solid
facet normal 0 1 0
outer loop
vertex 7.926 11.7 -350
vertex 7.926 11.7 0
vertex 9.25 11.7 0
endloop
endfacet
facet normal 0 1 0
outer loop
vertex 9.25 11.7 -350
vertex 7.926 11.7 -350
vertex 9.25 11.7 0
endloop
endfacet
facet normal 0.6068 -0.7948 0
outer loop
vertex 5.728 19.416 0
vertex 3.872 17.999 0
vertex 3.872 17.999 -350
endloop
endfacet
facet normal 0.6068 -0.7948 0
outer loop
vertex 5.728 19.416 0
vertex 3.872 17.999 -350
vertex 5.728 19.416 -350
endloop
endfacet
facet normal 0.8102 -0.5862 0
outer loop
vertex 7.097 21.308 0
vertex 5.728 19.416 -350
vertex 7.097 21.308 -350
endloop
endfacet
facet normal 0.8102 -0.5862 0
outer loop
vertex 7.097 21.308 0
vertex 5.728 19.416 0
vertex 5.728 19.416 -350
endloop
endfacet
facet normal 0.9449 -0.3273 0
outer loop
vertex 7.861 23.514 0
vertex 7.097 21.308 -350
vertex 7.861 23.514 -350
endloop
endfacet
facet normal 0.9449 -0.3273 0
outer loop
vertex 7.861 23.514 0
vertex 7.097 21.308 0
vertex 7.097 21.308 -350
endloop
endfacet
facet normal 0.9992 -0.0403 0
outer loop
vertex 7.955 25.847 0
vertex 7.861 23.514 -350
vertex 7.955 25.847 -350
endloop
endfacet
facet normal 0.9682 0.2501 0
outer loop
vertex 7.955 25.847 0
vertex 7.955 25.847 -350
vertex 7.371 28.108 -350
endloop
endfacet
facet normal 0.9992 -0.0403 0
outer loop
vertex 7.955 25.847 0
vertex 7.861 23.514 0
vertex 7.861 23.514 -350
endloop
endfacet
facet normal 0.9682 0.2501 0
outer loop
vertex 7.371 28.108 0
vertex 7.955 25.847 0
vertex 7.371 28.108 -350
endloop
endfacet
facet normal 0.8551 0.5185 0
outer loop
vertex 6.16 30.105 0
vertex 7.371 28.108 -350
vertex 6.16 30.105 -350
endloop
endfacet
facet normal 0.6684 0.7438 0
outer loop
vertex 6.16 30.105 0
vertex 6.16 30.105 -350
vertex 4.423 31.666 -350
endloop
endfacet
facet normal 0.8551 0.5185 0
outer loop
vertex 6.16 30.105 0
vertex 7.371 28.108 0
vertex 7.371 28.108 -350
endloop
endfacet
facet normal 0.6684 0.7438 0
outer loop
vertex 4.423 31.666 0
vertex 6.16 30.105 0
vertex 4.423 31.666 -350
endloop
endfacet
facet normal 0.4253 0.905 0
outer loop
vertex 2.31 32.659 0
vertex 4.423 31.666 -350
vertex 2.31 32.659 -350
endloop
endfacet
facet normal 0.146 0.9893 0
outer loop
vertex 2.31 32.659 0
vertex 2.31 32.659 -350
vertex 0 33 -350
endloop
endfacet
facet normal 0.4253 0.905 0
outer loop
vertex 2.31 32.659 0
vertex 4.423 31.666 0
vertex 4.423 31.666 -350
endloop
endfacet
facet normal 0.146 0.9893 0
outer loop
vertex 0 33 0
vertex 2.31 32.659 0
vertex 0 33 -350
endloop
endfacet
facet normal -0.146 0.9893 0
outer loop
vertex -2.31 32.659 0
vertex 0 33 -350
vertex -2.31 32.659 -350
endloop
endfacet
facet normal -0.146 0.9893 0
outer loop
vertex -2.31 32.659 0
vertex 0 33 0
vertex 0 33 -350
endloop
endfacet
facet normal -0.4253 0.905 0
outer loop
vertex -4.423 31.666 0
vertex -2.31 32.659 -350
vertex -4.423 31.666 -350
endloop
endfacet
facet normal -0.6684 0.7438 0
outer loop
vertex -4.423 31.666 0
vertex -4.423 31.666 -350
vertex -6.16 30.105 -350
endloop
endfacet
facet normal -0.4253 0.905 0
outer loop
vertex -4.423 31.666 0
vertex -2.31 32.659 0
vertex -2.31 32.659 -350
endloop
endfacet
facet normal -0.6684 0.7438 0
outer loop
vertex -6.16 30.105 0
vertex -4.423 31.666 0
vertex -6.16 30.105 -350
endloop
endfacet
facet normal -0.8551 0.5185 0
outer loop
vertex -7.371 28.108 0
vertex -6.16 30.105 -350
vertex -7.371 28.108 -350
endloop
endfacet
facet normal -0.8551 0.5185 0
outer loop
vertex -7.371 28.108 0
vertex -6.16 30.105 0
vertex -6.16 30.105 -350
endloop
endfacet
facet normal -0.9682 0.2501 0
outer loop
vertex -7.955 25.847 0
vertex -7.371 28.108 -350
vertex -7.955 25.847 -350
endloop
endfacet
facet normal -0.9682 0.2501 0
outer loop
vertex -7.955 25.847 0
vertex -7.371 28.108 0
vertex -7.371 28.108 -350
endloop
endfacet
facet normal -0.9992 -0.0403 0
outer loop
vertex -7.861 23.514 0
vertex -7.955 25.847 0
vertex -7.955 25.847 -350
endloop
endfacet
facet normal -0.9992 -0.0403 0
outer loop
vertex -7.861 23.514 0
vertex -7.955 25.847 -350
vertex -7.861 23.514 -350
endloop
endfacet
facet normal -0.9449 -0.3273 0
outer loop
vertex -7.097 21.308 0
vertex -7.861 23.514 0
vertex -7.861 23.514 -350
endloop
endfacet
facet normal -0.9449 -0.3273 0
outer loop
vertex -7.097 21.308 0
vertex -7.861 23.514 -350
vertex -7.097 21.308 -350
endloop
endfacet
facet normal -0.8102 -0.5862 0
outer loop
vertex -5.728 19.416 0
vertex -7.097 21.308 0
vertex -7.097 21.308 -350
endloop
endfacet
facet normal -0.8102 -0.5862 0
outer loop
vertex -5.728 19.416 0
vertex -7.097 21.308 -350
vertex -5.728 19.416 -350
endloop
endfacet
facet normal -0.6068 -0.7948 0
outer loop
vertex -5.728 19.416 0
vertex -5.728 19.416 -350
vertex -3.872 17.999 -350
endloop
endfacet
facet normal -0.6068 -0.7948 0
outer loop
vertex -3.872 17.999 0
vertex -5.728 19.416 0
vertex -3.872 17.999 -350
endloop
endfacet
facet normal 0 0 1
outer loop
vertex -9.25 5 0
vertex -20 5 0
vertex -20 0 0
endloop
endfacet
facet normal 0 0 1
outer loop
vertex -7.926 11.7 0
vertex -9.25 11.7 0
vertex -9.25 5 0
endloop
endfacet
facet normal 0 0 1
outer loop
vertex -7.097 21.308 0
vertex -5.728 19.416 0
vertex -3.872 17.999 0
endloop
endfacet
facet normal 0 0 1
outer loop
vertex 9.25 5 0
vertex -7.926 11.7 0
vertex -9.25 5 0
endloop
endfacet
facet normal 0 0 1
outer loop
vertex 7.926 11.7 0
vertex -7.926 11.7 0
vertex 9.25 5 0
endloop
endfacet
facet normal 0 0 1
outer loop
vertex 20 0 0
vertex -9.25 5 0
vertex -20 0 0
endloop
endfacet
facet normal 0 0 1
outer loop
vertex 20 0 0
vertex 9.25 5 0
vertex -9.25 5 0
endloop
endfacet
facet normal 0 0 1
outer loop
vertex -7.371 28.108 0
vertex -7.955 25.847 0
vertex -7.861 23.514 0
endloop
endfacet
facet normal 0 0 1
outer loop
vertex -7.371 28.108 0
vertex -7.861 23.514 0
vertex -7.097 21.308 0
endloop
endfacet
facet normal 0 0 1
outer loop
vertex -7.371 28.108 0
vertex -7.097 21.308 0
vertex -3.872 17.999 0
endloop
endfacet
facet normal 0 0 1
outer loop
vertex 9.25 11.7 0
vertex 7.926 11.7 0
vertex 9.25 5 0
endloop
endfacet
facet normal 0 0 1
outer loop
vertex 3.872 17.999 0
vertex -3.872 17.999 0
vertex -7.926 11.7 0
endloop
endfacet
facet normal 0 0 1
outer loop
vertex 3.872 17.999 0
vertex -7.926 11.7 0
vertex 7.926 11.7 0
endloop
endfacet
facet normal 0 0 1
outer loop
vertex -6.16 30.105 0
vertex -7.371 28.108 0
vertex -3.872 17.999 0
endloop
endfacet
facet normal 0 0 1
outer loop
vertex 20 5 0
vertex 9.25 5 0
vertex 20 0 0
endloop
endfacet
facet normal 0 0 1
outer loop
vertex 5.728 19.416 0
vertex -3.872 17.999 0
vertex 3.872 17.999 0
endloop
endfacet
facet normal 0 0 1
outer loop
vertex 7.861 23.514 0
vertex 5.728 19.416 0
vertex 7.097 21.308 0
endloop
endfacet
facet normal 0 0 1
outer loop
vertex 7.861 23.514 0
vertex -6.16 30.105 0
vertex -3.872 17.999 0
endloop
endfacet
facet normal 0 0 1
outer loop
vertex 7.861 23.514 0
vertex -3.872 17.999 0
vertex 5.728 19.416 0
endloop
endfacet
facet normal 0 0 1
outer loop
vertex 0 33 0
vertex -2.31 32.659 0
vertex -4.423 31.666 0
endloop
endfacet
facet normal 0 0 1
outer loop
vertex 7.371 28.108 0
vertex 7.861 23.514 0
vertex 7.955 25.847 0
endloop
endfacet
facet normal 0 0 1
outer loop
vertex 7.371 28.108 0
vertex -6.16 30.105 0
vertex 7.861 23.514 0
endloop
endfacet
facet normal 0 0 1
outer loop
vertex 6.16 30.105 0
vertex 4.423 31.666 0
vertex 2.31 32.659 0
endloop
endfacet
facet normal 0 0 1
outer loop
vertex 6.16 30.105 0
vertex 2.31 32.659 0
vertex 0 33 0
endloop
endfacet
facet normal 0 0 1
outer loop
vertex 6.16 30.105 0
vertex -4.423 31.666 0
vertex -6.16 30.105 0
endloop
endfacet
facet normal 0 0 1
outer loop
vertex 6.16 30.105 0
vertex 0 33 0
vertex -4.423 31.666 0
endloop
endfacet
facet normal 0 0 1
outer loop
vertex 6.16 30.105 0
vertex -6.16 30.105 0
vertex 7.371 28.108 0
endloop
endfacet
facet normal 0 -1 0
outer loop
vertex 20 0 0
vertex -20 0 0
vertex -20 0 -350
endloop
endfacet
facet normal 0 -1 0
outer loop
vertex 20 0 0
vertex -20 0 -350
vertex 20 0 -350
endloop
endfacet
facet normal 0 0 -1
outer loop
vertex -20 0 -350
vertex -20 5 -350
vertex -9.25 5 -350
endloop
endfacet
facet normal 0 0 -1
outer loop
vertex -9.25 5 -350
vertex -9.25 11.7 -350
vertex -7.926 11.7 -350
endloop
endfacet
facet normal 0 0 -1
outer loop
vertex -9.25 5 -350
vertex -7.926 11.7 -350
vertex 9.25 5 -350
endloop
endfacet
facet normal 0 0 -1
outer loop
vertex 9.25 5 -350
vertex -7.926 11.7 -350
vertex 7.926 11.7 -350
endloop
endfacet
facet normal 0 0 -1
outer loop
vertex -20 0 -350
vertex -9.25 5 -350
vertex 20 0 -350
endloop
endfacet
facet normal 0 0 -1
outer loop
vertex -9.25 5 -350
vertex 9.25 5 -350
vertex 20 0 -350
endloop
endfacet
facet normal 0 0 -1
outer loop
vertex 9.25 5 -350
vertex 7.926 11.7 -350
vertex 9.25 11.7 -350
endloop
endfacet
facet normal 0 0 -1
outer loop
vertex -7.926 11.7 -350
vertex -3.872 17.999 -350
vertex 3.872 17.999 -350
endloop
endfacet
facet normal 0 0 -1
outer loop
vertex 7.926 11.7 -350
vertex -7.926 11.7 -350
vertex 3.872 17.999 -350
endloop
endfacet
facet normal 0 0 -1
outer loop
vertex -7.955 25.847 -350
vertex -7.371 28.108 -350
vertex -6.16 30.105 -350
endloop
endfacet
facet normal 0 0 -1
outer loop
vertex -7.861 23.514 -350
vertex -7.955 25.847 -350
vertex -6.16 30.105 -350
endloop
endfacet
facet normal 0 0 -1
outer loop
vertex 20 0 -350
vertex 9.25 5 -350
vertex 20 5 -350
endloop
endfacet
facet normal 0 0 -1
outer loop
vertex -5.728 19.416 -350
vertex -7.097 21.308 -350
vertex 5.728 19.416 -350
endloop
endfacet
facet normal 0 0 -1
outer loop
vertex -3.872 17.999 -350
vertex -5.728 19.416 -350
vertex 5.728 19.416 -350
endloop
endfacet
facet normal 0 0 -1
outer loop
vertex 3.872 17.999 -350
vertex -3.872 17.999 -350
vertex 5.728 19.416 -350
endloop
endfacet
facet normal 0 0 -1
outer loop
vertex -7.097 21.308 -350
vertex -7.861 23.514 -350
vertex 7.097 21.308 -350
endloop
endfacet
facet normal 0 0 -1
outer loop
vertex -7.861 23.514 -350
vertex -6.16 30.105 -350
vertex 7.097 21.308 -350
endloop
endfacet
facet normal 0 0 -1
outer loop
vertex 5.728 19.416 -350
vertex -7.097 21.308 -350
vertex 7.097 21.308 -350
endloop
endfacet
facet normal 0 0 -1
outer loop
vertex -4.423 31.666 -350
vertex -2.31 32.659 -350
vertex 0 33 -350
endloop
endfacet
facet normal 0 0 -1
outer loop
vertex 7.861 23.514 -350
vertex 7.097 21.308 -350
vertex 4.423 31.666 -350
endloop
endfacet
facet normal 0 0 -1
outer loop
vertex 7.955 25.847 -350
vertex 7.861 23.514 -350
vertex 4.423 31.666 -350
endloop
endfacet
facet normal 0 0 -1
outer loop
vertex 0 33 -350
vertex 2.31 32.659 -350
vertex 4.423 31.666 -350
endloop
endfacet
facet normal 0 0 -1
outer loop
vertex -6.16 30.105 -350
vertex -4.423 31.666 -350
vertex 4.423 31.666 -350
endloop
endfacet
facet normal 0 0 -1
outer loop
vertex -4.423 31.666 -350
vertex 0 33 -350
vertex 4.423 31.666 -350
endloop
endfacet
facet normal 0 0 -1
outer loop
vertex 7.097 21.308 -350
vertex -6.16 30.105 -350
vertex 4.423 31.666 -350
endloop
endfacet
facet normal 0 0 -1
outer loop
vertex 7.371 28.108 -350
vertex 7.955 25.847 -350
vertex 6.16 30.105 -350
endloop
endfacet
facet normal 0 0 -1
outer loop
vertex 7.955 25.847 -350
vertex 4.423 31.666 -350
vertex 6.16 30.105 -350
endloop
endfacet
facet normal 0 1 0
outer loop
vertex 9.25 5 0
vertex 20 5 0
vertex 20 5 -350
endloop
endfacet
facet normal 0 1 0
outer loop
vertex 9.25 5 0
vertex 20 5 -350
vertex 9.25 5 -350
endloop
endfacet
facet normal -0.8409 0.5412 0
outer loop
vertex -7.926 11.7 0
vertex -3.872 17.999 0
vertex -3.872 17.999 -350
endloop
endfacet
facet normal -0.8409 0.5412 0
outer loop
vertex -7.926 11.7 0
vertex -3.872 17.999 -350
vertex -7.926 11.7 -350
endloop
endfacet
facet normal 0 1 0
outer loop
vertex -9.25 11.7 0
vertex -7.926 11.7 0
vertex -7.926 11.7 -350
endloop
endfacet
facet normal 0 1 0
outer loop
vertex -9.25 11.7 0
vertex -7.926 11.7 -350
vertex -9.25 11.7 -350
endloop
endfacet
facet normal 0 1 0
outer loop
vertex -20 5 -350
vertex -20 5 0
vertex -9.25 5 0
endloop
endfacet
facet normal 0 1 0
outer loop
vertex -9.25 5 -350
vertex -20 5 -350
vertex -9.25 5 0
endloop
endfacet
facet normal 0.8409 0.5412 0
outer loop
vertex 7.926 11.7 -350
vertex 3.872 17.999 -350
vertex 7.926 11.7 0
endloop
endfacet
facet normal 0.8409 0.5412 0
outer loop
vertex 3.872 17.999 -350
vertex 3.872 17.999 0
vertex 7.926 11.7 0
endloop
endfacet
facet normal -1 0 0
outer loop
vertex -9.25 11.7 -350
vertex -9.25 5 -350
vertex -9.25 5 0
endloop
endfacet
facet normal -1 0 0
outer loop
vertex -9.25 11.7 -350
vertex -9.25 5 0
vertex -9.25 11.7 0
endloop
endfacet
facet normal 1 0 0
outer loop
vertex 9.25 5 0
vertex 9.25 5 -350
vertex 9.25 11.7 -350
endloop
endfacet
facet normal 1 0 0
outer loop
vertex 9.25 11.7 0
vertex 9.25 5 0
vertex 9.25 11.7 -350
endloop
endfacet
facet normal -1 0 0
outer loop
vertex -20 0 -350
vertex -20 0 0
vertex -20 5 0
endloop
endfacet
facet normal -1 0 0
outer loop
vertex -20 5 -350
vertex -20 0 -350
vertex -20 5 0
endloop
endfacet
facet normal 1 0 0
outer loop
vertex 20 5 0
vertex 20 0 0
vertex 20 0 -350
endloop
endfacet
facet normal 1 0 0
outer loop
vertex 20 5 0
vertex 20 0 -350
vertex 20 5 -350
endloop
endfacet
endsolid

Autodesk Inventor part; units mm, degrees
ref_plane "YZ Plane" through (0, 0, 0) normal (1, 0, 0) x (0, 1, 0)
ref_plane "XZ Plane" through (0, 0, 0) normal (0, 1, 0) x (-1, 0, 0)
ref_plane "XY Plane" through (0, 0, 0) normal (0, 0, 1) x (1, 0, 0)
sketch "Sketch1" plane through (0, 0, 0) normal (0, 0, 1) x (1, 0, 0)
  line L0 (-20, 0) -> (20, 0)
  line L1 (-20, 0) -> (-20, 5)
  line L2 (20, 0) -> (20, 5)
  line L3 (-20, 5) -> (-9.25, 5)
  line L4 (20, 5) -> (9.25, 5)
  line L5 (-9.25, 5) -> (-9.25, 11.7)
  line L6 (9.25, 5) -> (9.25, 11.7)
  line L7 (-9.25, 5) -> (9.25, 5) construction
  line L8 (-9.25, 5) -> (-4.2961, 5) construction
  line L9 (9.25, 5) -> (3.3755, 5) construction
  arc A0 (4.1601, 14.485) -> (5.7961, 15.0092) centre (4, 17.8) ccw construction
  line L10 (7.926, 11.7) -> (9.25, 11.7)
  line L11 (-7.926, 11.7) -> (-9.25, 11.7)
  arc A1 (3.8717, 17.9993) -> (-3.8717, 17.9993) centre (0, 25) ccw
  line L12 (-3.8717, 17.9993) -> (-7.926, 11.7)
  line L13 (3.8717, 17.9993) -> (7.926, 11.7)
  point P0 (0, 0)
  point P1 (0, 0)
  point P2 (0, 17.8)
  point P3 (0, 5)
  point P4 (-4, 17.8)
  dimension "d0" = 40
  dimension "d1" = 5
  dimension "d2" = 5
  dimension "d3" = 10.75
  dimension "d4" = 10.75
  dimension "d5" = 6.7
  dimension "d6" = 6.7
  dimension "d15" = 25
  dimension "d16" = 18.5
  dimension "d18" = 8
extrude "Extrusion1" add sketch "Sketch1" against normal blind 350
equation "\"d1\" = d2"
equation "\"d3\" = d4"
equation "\"d5\" = d6"
properties part number "sbr16"
